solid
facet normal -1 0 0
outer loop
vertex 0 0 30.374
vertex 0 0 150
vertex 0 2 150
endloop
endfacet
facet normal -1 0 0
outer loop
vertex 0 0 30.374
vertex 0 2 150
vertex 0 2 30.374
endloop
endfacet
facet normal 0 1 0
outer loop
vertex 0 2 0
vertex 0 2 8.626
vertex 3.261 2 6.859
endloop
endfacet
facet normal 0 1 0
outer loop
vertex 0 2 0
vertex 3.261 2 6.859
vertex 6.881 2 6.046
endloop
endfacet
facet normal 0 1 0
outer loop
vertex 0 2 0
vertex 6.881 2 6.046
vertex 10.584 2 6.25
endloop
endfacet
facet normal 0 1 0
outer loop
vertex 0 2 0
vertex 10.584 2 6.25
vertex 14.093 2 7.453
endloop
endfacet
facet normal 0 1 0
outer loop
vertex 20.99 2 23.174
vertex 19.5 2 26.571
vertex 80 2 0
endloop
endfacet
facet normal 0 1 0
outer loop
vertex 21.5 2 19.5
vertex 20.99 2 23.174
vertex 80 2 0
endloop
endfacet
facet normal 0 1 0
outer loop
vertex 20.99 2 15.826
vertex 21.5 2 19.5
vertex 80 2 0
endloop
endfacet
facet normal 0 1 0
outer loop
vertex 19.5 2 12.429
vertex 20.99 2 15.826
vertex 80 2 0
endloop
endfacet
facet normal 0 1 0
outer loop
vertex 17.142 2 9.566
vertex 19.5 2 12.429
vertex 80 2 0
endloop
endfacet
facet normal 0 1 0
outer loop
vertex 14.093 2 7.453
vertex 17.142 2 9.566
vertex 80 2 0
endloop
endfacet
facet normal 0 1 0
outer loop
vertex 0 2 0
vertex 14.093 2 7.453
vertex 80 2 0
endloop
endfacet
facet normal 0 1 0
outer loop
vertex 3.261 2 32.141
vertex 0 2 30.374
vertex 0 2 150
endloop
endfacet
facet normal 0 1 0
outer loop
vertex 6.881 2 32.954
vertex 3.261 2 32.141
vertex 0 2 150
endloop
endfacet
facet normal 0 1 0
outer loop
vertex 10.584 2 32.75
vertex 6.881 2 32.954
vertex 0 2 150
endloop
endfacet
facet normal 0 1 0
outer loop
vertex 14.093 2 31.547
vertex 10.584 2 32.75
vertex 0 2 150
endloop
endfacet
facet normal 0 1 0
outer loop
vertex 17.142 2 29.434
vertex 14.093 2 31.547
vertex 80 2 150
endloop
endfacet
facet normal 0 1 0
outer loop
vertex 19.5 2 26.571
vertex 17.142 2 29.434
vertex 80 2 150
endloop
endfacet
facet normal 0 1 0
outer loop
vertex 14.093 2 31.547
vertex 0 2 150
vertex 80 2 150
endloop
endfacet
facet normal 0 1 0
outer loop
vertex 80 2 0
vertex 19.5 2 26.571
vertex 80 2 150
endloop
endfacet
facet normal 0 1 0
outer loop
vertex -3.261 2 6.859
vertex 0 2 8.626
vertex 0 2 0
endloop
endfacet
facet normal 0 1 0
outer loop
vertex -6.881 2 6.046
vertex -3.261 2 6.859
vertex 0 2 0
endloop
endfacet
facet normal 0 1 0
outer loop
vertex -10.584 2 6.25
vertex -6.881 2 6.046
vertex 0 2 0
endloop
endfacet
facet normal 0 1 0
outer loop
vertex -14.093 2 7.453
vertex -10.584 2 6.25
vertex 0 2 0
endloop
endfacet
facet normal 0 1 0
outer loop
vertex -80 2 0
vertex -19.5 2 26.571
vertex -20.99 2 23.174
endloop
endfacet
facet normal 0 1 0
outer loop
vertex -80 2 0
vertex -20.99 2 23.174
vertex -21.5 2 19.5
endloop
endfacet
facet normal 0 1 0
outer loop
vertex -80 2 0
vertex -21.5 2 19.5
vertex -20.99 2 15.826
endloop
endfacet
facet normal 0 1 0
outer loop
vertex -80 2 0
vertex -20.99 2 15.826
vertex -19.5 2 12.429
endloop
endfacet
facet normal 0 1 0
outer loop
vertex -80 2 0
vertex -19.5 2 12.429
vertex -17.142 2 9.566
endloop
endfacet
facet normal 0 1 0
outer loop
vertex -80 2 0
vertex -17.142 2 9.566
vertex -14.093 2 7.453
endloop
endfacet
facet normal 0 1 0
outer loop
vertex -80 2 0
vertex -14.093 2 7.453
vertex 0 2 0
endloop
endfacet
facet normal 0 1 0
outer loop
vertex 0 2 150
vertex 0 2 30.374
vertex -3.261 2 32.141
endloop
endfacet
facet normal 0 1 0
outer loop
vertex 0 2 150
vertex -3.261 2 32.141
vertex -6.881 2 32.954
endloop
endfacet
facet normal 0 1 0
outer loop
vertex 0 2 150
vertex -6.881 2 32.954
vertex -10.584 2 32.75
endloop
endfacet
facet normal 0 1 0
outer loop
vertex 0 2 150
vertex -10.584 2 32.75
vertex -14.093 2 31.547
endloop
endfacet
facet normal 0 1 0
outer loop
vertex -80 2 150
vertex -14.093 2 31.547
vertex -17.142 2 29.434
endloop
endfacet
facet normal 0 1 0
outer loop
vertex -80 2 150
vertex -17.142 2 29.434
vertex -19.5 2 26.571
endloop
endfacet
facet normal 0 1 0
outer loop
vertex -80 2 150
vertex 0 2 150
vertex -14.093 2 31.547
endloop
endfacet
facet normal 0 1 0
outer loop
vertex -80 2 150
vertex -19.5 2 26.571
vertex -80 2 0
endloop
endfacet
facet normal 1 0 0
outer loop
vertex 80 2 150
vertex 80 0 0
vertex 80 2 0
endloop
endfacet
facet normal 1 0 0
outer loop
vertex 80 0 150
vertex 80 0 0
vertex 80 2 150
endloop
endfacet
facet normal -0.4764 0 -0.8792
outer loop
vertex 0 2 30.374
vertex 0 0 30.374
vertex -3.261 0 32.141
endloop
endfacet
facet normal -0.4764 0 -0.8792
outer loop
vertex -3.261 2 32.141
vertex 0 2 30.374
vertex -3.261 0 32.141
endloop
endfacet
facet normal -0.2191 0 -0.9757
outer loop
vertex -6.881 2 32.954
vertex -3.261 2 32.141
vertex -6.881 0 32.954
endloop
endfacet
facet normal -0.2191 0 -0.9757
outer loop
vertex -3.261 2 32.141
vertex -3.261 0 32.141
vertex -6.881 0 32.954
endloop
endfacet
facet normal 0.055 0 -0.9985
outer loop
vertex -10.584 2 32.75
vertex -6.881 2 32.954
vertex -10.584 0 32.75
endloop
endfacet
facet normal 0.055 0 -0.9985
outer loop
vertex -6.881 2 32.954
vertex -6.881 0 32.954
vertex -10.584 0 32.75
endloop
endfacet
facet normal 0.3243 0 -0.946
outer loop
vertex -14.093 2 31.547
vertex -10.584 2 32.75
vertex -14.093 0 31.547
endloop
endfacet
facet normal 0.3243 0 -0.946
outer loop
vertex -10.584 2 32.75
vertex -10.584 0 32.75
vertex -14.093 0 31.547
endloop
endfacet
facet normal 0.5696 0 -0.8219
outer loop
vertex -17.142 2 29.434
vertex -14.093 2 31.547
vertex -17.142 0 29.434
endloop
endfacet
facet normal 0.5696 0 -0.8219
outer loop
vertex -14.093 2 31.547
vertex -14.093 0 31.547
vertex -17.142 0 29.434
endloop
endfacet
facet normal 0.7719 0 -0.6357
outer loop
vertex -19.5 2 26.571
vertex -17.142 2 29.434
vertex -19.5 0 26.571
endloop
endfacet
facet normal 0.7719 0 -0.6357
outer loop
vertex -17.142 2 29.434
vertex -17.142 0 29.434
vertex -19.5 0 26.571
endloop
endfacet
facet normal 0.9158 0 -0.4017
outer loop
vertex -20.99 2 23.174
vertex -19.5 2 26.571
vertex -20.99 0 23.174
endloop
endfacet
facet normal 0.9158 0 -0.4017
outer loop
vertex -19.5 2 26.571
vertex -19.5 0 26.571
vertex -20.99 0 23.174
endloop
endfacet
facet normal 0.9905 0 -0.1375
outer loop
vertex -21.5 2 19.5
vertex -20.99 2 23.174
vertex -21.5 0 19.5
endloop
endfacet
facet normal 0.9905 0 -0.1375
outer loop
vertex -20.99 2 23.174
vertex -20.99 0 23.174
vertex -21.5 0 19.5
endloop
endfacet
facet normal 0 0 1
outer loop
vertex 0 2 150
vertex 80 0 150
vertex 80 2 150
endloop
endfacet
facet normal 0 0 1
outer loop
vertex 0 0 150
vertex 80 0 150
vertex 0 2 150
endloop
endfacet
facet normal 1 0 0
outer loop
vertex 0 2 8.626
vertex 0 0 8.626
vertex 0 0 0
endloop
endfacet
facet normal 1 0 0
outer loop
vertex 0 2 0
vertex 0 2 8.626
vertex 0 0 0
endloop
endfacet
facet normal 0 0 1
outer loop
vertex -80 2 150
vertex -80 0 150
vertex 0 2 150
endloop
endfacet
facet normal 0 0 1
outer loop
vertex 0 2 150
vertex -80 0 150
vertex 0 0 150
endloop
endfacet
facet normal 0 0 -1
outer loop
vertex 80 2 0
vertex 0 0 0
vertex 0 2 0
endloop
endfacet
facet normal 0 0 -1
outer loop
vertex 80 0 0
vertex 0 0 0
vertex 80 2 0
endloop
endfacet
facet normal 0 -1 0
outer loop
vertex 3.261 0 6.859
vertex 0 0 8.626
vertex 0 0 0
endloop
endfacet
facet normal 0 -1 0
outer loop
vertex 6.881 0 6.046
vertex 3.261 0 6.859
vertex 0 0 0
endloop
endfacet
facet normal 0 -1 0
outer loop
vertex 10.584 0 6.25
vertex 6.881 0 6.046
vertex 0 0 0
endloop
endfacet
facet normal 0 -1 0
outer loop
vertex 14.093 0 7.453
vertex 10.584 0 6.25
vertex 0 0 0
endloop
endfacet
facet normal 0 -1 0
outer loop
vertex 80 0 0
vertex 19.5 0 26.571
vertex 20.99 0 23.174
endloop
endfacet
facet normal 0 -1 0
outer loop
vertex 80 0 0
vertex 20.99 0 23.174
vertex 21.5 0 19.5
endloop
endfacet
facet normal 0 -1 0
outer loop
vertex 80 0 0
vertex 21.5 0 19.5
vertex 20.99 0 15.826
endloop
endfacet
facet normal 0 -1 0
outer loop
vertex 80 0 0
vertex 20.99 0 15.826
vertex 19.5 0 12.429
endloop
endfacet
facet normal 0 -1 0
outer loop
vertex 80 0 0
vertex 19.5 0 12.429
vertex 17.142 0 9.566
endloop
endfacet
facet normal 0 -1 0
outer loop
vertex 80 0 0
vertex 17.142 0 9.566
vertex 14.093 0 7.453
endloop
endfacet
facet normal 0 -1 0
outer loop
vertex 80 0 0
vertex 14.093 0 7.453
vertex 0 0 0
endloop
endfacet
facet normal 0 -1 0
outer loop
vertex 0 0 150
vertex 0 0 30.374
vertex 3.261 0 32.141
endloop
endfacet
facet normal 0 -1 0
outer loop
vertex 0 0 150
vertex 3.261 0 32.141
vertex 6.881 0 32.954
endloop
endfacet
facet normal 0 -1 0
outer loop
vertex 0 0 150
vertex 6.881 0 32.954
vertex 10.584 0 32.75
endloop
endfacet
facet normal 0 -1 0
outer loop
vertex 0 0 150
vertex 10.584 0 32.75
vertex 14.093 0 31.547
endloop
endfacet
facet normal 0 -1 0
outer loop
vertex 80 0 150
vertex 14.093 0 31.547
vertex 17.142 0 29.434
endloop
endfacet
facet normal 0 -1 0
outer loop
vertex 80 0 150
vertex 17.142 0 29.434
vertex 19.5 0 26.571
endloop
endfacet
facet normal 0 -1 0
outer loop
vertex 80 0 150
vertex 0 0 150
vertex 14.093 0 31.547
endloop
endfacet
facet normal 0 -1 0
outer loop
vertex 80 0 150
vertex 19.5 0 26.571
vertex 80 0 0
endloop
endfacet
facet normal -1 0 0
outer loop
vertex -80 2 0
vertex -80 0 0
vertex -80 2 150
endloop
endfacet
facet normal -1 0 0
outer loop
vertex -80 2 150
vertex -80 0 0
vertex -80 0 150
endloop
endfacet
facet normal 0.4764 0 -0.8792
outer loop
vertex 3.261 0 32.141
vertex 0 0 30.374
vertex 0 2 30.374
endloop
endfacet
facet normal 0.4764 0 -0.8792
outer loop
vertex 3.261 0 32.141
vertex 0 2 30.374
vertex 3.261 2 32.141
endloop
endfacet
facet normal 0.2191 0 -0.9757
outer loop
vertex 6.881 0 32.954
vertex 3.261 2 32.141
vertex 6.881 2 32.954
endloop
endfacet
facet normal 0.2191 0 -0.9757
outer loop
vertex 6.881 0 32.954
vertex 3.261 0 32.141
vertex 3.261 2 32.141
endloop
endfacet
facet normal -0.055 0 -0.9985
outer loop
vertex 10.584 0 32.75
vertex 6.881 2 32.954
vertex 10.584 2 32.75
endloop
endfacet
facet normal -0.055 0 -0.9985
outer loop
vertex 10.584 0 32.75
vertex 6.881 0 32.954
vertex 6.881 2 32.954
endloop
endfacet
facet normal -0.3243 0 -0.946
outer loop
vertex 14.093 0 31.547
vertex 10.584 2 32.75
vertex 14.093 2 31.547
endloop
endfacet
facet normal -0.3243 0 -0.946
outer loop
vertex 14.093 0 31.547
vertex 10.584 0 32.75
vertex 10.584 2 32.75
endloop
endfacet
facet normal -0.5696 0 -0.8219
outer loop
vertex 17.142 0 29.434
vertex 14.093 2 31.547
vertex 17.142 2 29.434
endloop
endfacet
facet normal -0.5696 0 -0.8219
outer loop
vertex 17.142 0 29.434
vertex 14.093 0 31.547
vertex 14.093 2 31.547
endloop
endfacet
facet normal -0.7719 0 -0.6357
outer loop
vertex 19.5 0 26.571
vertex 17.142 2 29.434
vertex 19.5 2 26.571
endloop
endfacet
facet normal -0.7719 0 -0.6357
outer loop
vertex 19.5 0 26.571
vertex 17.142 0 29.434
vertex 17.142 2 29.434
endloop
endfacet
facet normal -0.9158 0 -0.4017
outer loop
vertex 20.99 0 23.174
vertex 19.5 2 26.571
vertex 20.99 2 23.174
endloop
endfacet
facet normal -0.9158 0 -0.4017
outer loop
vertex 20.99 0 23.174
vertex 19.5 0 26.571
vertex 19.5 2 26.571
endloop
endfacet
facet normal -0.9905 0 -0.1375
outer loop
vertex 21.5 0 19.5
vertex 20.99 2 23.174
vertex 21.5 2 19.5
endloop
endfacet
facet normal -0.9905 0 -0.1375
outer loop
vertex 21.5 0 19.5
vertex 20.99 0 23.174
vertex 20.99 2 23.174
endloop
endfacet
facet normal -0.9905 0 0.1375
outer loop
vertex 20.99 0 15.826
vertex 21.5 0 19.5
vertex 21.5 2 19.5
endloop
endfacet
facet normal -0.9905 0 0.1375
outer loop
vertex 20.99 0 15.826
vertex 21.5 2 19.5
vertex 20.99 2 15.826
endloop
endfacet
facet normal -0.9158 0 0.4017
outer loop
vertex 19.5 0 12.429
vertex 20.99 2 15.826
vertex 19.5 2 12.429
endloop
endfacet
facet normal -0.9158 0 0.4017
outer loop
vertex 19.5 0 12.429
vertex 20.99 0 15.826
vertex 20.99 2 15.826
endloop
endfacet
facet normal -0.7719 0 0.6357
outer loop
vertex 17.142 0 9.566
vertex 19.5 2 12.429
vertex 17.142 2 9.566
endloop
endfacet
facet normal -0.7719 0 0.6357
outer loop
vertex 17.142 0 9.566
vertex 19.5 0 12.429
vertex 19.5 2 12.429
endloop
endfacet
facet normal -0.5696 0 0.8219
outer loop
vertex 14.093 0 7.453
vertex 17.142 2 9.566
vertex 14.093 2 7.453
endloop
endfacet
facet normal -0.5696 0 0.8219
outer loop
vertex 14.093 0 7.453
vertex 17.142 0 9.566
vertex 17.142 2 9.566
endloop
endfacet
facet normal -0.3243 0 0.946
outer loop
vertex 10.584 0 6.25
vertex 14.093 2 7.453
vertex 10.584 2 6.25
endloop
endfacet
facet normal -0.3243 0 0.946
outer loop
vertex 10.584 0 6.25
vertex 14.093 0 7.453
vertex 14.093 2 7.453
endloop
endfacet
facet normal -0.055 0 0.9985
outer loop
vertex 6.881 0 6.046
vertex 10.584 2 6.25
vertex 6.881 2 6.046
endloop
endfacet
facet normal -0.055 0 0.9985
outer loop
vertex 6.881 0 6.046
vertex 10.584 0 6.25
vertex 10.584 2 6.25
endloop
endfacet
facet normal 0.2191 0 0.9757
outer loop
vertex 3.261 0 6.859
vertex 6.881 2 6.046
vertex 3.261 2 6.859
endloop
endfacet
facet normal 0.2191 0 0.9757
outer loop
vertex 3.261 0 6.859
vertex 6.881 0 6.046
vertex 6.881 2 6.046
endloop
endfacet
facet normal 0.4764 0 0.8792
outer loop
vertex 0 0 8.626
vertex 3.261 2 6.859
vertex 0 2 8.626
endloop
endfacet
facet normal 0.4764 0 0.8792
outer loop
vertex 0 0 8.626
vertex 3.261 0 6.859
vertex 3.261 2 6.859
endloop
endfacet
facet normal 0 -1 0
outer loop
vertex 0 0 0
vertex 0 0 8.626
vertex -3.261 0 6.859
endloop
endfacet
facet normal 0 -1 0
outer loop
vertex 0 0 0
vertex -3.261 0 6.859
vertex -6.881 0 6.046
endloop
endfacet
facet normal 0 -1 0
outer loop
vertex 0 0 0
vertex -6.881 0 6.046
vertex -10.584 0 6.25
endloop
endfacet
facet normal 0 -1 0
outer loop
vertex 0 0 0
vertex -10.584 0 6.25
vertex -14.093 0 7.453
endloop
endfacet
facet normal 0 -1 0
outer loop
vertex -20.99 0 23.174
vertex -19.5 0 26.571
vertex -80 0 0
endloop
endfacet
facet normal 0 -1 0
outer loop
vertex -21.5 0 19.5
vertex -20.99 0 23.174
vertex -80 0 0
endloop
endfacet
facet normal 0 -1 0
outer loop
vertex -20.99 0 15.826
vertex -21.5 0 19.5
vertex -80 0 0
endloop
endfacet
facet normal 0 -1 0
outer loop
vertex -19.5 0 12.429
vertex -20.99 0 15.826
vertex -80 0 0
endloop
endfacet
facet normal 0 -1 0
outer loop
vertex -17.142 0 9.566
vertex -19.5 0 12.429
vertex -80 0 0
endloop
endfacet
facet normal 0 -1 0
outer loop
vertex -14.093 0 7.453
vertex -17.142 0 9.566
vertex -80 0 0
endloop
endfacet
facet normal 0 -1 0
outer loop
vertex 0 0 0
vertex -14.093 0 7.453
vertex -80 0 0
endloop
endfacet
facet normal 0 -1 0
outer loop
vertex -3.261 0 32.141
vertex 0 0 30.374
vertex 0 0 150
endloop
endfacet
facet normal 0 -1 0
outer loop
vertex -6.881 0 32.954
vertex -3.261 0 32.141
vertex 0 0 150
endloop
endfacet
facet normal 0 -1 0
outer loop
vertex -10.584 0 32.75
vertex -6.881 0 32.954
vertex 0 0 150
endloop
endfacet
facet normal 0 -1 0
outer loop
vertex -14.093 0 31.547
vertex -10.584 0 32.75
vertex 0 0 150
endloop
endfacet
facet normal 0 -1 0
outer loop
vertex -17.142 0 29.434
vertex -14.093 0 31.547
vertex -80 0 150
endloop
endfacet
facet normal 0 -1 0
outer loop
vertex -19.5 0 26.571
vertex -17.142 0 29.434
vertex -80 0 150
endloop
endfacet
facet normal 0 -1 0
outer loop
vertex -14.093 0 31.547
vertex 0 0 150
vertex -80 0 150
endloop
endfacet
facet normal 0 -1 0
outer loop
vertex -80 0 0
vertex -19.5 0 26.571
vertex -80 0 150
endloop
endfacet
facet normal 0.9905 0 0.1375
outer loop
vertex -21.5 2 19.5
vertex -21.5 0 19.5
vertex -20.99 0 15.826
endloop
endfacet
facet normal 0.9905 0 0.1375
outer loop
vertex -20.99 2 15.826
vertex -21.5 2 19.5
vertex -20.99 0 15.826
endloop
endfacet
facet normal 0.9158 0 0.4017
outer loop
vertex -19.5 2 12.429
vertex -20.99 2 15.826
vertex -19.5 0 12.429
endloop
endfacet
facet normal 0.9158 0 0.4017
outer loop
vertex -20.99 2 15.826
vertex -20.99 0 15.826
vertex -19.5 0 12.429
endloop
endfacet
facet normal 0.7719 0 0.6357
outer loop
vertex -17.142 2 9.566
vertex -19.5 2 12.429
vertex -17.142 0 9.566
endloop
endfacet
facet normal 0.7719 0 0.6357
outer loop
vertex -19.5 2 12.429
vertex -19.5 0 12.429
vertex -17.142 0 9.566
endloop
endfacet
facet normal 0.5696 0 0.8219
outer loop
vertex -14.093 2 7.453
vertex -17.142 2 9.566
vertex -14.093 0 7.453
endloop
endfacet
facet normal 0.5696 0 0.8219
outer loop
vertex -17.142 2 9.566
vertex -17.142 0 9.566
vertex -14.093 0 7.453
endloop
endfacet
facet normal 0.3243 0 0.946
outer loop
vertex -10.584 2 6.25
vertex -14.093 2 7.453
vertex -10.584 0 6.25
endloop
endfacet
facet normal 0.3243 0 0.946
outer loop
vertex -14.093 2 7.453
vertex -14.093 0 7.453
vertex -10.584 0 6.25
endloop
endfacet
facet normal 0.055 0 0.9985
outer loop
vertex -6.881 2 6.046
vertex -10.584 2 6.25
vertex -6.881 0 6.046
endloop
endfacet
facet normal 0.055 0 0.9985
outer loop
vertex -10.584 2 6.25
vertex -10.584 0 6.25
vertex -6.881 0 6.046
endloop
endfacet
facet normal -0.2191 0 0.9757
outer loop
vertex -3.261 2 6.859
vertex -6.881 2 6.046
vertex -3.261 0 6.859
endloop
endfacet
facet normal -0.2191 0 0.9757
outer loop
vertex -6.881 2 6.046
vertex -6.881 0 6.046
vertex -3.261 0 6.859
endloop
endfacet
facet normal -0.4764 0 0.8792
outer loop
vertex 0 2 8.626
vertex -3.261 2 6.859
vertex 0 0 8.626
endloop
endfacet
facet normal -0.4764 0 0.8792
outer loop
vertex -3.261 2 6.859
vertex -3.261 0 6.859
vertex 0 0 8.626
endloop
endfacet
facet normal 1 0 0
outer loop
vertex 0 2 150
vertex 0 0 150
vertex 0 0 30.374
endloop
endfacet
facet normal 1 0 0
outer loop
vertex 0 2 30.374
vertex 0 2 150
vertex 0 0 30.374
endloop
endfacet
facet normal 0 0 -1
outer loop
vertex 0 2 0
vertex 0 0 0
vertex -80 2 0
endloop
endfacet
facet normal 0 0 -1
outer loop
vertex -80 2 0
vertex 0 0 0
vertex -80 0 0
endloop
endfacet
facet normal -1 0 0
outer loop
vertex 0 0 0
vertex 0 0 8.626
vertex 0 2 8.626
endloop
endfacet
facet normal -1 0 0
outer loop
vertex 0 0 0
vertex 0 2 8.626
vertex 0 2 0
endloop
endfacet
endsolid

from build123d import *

# Parameters (mm, degrees)
F1_DEPTH = 2


# Not quite as in the source:
# - a feature names something its author has since deleted; it is built from what else it names


with BuildPart() as f1:
    # F0 (on Front) → F1 (new body)
    with BuildSketch(Plane.XZ):
        with BuildLine():
            Line((0, 0), (80, 0))
            Line((80, 0), (80, 150))
            Line((80, 150), (0, 150))
            Line((0, 150), (0, 30.3742815855))
            ThreePointArc((0, 30.3742815855), (14.0930288035, 31.5467838032), (21.5, 19.5))
            ThreePointArc((21.5, 19.5), (14.0930288035, 7.4532161968), (0, 8.6257184145))
            Line((0, 8.6257184145), (0, 0))
        make_face()
    extrude(amount=-F1_DEPTH)


with BuildPart() as f2_1:
    # F2: instance of F1
    add(f1.part.mirror(Plane.YZ))


solid = Compound([f1.part, f2_1.part])
